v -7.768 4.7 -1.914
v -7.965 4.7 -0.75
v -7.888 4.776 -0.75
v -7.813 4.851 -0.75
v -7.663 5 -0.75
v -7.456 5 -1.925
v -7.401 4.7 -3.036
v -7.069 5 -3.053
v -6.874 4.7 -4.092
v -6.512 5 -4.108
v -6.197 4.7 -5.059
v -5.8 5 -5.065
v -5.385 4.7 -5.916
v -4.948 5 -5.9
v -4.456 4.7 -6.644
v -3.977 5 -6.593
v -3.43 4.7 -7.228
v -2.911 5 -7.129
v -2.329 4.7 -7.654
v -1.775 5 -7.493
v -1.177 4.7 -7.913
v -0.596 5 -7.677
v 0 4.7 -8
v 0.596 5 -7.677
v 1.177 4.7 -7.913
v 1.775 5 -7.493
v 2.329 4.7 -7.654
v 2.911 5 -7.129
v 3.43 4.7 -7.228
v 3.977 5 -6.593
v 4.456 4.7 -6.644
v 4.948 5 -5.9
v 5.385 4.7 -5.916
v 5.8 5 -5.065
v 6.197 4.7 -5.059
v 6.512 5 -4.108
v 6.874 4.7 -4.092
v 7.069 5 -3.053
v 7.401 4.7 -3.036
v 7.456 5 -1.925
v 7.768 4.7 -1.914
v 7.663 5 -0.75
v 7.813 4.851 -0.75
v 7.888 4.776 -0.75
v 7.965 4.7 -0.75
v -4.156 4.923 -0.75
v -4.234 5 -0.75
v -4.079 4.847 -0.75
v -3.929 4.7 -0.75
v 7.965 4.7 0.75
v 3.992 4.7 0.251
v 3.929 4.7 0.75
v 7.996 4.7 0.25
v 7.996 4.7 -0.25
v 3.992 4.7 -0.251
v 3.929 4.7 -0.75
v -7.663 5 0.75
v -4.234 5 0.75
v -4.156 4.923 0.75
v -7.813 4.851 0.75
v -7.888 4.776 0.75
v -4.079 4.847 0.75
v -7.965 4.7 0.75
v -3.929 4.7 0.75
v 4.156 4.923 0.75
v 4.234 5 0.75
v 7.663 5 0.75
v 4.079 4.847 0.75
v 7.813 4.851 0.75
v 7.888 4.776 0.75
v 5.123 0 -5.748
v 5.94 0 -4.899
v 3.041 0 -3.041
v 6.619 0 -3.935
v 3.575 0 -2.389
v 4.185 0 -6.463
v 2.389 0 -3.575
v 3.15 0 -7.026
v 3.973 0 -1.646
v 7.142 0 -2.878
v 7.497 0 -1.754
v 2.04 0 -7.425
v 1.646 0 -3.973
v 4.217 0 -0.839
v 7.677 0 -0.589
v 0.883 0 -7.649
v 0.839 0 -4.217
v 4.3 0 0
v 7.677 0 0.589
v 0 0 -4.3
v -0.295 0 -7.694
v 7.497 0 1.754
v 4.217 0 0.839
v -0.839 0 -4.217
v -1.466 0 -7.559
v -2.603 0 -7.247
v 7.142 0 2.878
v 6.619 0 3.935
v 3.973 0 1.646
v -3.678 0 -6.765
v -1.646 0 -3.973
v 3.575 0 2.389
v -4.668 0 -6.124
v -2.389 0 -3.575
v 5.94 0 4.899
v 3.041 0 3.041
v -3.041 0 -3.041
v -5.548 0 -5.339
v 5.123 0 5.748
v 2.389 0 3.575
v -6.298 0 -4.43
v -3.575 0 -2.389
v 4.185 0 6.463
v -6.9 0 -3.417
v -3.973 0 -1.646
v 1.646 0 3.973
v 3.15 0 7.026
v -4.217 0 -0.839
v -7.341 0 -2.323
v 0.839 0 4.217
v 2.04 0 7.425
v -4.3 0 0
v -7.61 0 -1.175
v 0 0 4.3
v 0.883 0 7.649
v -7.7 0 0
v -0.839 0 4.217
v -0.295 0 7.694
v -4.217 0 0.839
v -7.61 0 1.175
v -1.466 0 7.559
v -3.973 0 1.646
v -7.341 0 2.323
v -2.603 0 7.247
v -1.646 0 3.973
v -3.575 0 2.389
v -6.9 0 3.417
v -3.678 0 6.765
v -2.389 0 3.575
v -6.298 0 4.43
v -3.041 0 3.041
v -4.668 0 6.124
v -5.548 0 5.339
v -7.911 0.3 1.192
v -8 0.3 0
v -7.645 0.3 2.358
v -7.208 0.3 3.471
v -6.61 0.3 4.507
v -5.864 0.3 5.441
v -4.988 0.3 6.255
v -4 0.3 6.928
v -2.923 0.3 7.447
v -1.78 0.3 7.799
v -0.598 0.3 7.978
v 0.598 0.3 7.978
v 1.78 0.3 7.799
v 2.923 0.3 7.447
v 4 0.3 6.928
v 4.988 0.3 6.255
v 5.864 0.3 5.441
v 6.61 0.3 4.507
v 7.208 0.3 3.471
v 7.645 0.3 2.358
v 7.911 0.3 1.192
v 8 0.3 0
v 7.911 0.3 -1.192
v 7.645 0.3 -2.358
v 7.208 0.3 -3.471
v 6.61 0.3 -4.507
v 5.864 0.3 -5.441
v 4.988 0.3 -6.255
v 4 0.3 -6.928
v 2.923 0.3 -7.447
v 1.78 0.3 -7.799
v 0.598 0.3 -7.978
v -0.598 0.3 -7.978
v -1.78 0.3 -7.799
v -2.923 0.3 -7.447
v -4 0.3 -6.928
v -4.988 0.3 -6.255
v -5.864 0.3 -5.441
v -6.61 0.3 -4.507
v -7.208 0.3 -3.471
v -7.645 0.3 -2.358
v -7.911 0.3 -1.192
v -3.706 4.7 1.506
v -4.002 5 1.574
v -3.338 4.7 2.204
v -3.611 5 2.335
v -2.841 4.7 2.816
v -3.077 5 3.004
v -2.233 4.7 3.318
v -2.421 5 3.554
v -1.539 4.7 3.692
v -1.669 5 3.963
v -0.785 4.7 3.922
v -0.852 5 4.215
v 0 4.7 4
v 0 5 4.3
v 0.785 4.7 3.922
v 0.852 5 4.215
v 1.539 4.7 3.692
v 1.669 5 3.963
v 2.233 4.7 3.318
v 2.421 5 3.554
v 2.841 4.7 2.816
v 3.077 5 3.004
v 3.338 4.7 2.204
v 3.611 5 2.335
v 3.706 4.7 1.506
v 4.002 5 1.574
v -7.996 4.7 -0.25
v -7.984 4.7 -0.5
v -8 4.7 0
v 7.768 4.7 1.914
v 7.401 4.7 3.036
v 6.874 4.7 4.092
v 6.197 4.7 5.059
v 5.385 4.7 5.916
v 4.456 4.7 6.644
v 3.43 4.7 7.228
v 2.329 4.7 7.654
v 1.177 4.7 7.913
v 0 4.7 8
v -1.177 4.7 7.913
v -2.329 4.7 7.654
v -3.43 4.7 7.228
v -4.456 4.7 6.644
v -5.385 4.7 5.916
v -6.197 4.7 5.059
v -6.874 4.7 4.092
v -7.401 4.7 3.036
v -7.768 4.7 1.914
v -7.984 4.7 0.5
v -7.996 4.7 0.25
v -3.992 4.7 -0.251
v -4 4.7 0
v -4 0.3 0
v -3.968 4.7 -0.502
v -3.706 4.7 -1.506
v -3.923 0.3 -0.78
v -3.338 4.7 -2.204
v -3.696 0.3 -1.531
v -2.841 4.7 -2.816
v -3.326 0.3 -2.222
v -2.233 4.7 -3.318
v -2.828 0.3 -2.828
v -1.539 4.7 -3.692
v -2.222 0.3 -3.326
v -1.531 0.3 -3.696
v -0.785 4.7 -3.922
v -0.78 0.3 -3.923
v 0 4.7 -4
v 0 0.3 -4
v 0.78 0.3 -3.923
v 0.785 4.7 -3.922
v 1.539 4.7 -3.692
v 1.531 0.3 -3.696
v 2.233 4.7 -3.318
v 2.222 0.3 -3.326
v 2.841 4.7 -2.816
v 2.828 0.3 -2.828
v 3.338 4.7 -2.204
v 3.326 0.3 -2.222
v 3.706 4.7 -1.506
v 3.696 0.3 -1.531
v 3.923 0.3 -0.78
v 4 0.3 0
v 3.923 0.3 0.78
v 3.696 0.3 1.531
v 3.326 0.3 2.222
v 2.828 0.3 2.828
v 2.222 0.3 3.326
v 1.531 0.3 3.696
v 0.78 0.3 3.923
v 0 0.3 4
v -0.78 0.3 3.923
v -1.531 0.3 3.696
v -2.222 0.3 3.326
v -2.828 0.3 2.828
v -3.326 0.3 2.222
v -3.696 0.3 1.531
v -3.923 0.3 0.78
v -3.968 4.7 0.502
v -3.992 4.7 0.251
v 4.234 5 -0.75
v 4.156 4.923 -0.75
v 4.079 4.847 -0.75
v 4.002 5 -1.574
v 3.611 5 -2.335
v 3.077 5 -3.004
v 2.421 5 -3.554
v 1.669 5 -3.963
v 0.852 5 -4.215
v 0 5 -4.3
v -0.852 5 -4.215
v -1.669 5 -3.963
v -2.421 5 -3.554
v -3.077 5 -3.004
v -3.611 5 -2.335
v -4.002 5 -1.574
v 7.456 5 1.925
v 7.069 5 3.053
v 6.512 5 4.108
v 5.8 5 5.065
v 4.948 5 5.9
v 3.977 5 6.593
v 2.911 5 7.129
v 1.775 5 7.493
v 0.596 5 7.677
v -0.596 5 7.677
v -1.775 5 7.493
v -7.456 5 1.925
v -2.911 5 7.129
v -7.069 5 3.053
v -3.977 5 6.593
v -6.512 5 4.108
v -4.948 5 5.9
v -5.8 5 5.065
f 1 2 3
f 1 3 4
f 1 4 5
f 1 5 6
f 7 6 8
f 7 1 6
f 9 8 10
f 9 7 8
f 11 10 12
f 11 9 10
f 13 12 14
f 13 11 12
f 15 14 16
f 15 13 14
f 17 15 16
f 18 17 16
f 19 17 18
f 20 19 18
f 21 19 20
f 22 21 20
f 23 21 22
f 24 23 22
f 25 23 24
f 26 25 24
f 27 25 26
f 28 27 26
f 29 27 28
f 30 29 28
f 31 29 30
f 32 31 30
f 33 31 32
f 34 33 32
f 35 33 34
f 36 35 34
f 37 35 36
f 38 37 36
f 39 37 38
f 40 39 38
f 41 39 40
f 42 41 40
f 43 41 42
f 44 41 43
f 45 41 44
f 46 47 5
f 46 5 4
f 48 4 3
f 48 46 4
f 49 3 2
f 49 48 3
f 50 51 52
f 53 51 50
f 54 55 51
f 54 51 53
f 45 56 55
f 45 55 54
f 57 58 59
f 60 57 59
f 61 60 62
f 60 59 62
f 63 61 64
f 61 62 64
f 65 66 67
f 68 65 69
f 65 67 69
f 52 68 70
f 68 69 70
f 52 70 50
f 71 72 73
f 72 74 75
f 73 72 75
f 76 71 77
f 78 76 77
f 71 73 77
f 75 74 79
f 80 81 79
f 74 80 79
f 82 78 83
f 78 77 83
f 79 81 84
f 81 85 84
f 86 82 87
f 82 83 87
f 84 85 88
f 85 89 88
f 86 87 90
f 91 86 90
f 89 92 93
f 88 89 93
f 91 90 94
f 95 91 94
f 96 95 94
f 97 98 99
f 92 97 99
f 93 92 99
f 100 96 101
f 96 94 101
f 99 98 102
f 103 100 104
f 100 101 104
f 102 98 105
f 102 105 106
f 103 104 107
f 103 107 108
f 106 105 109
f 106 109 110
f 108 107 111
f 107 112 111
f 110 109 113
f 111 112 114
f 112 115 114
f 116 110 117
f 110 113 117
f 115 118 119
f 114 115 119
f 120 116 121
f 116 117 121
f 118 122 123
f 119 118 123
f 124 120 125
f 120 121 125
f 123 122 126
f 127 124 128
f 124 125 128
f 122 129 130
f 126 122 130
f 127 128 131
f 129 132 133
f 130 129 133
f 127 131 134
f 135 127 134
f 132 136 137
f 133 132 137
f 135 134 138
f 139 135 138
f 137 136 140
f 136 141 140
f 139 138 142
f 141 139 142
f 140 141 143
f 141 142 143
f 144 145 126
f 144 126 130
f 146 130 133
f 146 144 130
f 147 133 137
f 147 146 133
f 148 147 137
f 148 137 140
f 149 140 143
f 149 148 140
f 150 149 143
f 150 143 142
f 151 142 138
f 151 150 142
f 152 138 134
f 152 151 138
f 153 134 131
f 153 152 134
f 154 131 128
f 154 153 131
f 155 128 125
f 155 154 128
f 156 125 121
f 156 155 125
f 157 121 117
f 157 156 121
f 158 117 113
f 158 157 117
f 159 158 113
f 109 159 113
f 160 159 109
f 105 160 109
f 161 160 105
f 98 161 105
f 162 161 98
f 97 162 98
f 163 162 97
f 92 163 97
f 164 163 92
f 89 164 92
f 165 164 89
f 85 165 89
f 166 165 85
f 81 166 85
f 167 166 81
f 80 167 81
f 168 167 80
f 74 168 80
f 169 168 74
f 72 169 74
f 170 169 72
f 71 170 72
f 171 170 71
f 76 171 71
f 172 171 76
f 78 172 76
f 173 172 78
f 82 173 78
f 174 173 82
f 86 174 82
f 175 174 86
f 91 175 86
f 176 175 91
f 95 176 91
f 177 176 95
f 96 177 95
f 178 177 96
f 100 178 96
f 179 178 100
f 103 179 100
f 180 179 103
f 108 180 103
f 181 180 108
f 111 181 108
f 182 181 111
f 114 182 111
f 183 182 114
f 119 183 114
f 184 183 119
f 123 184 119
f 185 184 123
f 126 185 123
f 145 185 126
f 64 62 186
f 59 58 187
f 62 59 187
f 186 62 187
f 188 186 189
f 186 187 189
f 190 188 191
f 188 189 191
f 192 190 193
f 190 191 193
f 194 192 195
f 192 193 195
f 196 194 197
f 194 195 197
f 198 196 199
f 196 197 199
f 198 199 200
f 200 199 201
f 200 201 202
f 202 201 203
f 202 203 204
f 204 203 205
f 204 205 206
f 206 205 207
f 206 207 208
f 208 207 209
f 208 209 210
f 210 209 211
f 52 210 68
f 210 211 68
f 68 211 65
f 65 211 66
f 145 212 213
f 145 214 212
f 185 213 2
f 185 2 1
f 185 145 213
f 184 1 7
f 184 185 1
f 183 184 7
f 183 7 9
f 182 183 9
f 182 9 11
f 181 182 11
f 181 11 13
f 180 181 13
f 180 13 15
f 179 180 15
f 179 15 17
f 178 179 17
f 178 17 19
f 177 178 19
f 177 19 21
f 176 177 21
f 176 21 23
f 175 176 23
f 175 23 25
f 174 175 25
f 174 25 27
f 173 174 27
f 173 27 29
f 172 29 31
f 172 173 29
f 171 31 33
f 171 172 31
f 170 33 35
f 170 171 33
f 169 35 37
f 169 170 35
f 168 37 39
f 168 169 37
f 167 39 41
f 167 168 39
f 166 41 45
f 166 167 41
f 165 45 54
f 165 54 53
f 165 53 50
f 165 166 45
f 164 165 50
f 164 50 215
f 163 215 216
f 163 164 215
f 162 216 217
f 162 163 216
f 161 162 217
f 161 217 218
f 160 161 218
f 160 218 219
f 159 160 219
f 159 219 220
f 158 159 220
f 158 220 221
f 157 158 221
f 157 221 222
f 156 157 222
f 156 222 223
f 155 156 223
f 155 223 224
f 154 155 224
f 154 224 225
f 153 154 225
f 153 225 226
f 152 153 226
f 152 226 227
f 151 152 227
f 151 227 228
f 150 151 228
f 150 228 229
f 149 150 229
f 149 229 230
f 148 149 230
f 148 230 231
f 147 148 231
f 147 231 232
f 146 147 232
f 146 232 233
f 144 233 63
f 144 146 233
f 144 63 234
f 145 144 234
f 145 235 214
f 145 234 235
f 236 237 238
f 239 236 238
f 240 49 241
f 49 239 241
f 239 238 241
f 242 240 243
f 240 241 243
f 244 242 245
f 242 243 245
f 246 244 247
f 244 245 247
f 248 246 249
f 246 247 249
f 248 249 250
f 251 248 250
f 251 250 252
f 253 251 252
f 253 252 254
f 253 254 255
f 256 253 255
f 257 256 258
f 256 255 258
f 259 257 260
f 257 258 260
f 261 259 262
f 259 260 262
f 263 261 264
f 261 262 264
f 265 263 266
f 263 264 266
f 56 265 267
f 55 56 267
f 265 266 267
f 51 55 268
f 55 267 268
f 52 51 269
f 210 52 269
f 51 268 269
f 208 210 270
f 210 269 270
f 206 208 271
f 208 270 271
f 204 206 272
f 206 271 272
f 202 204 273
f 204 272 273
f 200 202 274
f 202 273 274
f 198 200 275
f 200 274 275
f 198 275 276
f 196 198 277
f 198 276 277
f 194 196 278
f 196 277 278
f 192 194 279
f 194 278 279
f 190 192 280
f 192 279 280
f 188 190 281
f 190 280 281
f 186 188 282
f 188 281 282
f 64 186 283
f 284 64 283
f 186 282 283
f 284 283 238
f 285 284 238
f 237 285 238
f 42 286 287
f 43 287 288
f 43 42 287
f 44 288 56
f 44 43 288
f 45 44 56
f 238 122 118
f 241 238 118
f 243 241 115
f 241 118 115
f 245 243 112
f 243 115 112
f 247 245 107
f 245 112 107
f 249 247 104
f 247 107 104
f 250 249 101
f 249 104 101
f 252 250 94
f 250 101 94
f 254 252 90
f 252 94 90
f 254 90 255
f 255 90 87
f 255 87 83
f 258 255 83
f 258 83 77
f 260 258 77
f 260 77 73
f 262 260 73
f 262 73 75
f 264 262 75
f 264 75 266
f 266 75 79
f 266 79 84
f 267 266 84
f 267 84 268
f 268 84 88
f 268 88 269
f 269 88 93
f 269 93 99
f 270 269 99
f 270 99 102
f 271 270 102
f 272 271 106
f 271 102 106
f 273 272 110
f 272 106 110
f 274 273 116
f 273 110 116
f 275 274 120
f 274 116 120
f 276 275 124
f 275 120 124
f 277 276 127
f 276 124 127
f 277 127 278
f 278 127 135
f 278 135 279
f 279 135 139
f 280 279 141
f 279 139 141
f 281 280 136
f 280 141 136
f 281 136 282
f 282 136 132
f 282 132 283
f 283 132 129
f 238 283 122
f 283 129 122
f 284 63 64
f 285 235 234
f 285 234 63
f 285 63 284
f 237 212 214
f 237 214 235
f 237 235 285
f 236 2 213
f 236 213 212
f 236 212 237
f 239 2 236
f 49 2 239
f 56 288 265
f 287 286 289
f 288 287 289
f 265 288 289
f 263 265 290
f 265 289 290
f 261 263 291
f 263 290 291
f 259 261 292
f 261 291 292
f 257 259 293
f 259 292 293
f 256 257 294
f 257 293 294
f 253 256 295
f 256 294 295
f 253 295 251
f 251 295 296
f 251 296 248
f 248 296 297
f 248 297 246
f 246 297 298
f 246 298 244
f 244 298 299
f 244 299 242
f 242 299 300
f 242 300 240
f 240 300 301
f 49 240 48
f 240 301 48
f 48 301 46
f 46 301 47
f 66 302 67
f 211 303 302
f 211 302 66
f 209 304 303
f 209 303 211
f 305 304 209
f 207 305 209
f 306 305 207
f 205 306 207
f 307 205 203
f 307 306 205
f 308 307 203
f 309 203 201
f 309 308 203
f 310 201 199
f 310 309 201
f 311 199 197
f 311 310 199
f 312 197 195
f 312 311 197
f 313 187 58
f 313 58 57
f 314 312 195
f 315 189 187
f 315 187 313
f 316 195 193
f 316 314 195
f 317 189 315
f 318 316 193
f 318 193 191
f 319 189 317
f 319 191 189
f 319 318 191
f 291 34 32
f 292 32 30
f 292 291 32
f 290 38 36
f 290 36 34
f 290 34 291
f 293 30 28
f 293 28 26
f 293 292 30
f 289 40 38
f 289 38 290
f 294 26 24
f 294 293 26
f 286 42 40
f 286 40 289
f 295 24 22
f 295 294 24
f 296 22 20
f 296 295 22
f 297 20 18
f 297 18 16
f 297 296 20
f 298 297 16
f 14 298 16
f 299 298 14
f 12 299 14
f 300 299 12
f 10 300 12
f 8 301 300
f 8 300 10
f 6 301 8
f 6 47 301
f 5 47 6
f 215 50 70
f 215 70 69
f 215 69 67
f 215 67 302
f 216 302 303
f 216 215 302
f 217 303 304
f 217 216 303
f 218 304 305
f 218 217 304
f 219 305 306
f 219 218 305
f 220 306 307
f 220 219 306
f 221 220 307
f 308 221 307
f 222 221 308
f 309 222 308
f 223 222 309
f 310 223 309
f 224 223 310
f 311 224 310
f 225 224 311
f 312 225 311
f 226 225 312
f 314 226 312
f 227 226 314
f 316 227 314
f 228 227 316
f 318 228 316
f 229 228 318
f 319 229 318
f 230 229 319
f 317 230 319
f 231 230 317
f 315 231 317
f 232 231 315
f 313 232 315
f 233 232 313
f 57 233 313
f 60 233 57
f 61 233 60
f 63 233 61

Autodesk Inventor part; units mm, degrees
ref_plane "YZ Plane" through (0, 0, 0) normal (1, 0, 0) x (0, 1, 0)
ref_plane "XZ Plane" through (0, 0, 0) normal (0, 1, 0) x (-1, 0, 0)
ref_plane "XY Plane" through (0, 0, 0) normal (0, 0, 1) x (1, 0, 0)
sketch "スケッチ1" plane through (0, 0, 0) normal (0, 1, 0) x (-1, 0, 0)
  circle A0 centre (0, 0) radius 8
  circle A1 centre (0, 0) radius 4
  dimension "d0" = 16
  dimension "d1" = 8
extrude "押し出し1" add sketch "スケッチ1" along normal blind 5
sketch "スケッチ2" plane through (0, 5, 0) normal (0, 1, 0) x (1, 0, 0)
  circle A0 centre (0, 0) radius 8 projected
  line L0 (-8, 0) -> (8, 0)
  line L1 (-8, 0.75) -> (8, 0.75)
  line L2 (-8, 0.75) -> (-8, 0)
  line L3 (8, 0.75) -> (8, 0)
  line L4 (-8, -0.75) -> (8, -0.75)
  line L5 (-8, -0.75) -> (-8, 0)
  line L6 (8, -0.75) -> (8, 0)
  point P0 (7.9648, 0.75)
  point P1 (-7.9648, 0.75)
  point P2 (-7.9648, -0.75)
  point P3 (7.9648, -0.75)
  dimension "d4" = 0.75
extrude "押し出し2" cut sketch "スケッチ2" against normal blind 0.3 contours L0 A0 L1 | A0 L4 L0
chamfer "面取り1" distance 0.3 angle 45 6 edges at (0, 5, 4) (0, 5, -4) (0, 5, -8) (0, 5, 8) (8, 0, 0) (4, 0, 0)
properties part number "GSB-081605"
